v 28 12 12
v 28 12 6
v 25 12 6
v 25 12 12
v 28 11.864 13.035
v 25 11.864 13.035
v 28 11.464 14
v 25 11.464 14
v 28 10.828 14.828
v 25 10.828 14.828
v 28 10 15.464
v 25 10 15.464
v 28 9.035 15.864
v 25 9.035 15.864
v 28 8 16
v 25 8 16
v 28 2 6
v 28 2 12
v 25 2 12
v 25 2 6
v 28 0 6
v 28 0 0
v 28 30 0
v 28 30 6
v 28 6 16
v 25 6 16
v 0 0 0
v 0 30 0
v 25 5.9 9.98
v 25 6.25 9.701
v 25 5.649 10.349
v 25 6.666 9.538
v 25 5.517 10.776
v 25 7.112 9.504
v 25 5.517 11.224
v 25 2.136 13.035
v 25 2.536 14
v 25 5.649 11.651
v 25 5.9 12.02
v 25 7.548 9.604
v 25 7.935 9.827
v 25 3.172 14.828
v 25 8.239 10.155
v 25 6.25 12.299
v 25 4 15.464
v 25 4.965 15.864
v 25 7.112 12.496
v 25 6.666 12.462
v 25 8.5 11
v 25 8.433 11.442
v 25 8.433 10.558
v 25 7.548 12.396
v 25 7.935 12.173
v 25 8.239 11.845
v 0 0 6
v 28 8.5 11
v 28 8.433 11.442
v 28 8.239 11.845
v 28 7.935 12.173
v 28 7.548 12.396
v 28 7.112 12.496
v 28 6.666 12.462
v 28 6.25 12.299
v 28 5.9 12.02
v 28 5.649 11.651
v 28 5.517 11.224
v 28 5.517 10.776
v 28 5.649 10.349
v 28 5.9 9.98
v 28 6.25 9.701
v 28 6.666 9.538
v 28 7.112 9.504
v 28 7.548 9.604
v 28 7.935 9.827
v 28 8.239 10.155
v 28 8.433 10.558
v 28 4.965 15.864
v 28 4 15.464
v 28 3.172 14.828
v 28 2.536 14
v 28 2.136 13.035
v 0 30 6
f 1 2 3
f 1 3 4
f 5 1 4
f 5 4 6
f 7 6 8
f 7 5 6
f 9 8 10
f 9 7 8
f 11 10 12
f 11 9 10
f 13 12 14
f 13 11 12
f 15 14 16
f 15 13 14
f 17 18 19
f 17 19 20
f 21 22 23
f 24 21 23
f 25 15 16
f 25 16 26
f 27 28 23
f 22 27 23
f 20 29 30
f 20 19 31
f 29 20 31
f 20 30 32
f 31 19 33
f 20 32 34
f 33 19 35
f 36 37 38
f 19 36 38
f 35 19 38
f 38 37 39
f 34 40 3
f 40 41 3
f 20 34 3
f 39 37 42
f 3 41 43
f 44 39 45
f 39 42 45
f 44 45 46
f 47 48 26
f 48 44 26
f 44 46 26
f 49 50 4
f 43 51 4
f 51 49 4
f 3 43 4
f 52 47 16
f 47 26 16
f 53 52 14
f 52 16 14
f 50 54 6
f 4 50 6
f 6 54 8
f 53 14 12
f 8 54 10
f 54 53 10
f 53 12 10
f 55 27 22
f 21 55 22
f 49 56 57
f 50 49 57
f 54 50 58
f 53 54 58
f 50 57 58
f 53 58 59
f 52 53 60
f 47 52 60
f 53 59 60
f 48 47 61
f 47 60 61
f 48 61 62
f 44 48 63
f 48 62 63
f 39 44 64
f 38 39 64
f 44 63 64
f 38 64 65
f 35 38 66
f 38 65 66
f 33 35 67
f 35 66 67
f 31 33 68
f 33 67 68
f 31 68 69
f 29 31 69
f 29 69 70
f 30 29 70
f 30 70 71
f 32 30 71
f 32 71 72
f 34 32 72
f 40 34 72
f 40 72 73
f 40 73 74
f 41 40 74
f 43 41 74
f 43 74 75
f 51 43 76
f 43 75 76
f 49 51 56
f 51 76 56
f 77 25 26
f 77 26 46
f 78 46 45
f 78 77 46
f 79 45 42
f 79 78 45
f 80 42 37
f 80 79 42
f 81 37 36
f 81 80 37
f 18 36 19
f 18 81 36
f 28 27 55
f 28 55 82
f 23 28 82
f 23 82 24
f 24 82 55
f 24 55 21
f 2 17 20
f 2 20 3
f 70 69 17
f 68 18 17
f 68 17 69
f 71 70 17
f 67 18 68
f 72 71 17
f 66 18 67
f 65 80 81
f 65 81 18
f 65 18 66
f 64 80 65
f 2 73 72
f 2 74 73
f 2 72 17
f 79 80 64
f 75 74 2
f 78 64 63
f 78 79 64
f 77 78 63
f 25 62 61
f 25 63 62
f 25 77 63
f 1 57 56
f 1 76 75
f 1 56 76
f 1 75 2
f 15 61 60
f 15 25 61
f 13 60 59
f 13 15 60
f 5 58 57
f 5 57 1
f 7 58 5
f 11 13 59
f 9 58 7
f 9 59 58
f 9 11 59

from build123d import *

# Parameters (mm, degrees)
F0_W     = 28
F0_H     = 30
F1_DEPTH = 6
F2_R     = 1.5
F3_DEPTH = 3


with BuildPart() as f1:
    # F0 (on Top) → F1 (new body)
    with BuildSketch(Plane.XY):
        with Locations((14, 15)):
            Rectangle(F0_W, F0_H)
    extrude(amount=F1_DEPTH)


with BuildPart() as f3:
    # F2 (on face) → F3 (new body)
    with BuildSketch(Plane.YZ.offset(28)):
        with BuildLine():
            Line((2, 12), (2, 6))
            Line((2, 6), (12, 6))
            Line((12, 6), (12, 12))
            ThreePointArc((12, 12), (10.828427, 14.828427), (8, 16))
            Line((8, 16), (6, 16))
            ThreePointArc((6, 16), (3.171573, 14.828427), (2, 12))
        make_face()
        with Locations((7, 11)):
            Circle(F2_R, mode=Mode.SUBTRACT)
    extrude(amount=-F3_DEPTH)


solid = Compound([f1.part, f3.part])
